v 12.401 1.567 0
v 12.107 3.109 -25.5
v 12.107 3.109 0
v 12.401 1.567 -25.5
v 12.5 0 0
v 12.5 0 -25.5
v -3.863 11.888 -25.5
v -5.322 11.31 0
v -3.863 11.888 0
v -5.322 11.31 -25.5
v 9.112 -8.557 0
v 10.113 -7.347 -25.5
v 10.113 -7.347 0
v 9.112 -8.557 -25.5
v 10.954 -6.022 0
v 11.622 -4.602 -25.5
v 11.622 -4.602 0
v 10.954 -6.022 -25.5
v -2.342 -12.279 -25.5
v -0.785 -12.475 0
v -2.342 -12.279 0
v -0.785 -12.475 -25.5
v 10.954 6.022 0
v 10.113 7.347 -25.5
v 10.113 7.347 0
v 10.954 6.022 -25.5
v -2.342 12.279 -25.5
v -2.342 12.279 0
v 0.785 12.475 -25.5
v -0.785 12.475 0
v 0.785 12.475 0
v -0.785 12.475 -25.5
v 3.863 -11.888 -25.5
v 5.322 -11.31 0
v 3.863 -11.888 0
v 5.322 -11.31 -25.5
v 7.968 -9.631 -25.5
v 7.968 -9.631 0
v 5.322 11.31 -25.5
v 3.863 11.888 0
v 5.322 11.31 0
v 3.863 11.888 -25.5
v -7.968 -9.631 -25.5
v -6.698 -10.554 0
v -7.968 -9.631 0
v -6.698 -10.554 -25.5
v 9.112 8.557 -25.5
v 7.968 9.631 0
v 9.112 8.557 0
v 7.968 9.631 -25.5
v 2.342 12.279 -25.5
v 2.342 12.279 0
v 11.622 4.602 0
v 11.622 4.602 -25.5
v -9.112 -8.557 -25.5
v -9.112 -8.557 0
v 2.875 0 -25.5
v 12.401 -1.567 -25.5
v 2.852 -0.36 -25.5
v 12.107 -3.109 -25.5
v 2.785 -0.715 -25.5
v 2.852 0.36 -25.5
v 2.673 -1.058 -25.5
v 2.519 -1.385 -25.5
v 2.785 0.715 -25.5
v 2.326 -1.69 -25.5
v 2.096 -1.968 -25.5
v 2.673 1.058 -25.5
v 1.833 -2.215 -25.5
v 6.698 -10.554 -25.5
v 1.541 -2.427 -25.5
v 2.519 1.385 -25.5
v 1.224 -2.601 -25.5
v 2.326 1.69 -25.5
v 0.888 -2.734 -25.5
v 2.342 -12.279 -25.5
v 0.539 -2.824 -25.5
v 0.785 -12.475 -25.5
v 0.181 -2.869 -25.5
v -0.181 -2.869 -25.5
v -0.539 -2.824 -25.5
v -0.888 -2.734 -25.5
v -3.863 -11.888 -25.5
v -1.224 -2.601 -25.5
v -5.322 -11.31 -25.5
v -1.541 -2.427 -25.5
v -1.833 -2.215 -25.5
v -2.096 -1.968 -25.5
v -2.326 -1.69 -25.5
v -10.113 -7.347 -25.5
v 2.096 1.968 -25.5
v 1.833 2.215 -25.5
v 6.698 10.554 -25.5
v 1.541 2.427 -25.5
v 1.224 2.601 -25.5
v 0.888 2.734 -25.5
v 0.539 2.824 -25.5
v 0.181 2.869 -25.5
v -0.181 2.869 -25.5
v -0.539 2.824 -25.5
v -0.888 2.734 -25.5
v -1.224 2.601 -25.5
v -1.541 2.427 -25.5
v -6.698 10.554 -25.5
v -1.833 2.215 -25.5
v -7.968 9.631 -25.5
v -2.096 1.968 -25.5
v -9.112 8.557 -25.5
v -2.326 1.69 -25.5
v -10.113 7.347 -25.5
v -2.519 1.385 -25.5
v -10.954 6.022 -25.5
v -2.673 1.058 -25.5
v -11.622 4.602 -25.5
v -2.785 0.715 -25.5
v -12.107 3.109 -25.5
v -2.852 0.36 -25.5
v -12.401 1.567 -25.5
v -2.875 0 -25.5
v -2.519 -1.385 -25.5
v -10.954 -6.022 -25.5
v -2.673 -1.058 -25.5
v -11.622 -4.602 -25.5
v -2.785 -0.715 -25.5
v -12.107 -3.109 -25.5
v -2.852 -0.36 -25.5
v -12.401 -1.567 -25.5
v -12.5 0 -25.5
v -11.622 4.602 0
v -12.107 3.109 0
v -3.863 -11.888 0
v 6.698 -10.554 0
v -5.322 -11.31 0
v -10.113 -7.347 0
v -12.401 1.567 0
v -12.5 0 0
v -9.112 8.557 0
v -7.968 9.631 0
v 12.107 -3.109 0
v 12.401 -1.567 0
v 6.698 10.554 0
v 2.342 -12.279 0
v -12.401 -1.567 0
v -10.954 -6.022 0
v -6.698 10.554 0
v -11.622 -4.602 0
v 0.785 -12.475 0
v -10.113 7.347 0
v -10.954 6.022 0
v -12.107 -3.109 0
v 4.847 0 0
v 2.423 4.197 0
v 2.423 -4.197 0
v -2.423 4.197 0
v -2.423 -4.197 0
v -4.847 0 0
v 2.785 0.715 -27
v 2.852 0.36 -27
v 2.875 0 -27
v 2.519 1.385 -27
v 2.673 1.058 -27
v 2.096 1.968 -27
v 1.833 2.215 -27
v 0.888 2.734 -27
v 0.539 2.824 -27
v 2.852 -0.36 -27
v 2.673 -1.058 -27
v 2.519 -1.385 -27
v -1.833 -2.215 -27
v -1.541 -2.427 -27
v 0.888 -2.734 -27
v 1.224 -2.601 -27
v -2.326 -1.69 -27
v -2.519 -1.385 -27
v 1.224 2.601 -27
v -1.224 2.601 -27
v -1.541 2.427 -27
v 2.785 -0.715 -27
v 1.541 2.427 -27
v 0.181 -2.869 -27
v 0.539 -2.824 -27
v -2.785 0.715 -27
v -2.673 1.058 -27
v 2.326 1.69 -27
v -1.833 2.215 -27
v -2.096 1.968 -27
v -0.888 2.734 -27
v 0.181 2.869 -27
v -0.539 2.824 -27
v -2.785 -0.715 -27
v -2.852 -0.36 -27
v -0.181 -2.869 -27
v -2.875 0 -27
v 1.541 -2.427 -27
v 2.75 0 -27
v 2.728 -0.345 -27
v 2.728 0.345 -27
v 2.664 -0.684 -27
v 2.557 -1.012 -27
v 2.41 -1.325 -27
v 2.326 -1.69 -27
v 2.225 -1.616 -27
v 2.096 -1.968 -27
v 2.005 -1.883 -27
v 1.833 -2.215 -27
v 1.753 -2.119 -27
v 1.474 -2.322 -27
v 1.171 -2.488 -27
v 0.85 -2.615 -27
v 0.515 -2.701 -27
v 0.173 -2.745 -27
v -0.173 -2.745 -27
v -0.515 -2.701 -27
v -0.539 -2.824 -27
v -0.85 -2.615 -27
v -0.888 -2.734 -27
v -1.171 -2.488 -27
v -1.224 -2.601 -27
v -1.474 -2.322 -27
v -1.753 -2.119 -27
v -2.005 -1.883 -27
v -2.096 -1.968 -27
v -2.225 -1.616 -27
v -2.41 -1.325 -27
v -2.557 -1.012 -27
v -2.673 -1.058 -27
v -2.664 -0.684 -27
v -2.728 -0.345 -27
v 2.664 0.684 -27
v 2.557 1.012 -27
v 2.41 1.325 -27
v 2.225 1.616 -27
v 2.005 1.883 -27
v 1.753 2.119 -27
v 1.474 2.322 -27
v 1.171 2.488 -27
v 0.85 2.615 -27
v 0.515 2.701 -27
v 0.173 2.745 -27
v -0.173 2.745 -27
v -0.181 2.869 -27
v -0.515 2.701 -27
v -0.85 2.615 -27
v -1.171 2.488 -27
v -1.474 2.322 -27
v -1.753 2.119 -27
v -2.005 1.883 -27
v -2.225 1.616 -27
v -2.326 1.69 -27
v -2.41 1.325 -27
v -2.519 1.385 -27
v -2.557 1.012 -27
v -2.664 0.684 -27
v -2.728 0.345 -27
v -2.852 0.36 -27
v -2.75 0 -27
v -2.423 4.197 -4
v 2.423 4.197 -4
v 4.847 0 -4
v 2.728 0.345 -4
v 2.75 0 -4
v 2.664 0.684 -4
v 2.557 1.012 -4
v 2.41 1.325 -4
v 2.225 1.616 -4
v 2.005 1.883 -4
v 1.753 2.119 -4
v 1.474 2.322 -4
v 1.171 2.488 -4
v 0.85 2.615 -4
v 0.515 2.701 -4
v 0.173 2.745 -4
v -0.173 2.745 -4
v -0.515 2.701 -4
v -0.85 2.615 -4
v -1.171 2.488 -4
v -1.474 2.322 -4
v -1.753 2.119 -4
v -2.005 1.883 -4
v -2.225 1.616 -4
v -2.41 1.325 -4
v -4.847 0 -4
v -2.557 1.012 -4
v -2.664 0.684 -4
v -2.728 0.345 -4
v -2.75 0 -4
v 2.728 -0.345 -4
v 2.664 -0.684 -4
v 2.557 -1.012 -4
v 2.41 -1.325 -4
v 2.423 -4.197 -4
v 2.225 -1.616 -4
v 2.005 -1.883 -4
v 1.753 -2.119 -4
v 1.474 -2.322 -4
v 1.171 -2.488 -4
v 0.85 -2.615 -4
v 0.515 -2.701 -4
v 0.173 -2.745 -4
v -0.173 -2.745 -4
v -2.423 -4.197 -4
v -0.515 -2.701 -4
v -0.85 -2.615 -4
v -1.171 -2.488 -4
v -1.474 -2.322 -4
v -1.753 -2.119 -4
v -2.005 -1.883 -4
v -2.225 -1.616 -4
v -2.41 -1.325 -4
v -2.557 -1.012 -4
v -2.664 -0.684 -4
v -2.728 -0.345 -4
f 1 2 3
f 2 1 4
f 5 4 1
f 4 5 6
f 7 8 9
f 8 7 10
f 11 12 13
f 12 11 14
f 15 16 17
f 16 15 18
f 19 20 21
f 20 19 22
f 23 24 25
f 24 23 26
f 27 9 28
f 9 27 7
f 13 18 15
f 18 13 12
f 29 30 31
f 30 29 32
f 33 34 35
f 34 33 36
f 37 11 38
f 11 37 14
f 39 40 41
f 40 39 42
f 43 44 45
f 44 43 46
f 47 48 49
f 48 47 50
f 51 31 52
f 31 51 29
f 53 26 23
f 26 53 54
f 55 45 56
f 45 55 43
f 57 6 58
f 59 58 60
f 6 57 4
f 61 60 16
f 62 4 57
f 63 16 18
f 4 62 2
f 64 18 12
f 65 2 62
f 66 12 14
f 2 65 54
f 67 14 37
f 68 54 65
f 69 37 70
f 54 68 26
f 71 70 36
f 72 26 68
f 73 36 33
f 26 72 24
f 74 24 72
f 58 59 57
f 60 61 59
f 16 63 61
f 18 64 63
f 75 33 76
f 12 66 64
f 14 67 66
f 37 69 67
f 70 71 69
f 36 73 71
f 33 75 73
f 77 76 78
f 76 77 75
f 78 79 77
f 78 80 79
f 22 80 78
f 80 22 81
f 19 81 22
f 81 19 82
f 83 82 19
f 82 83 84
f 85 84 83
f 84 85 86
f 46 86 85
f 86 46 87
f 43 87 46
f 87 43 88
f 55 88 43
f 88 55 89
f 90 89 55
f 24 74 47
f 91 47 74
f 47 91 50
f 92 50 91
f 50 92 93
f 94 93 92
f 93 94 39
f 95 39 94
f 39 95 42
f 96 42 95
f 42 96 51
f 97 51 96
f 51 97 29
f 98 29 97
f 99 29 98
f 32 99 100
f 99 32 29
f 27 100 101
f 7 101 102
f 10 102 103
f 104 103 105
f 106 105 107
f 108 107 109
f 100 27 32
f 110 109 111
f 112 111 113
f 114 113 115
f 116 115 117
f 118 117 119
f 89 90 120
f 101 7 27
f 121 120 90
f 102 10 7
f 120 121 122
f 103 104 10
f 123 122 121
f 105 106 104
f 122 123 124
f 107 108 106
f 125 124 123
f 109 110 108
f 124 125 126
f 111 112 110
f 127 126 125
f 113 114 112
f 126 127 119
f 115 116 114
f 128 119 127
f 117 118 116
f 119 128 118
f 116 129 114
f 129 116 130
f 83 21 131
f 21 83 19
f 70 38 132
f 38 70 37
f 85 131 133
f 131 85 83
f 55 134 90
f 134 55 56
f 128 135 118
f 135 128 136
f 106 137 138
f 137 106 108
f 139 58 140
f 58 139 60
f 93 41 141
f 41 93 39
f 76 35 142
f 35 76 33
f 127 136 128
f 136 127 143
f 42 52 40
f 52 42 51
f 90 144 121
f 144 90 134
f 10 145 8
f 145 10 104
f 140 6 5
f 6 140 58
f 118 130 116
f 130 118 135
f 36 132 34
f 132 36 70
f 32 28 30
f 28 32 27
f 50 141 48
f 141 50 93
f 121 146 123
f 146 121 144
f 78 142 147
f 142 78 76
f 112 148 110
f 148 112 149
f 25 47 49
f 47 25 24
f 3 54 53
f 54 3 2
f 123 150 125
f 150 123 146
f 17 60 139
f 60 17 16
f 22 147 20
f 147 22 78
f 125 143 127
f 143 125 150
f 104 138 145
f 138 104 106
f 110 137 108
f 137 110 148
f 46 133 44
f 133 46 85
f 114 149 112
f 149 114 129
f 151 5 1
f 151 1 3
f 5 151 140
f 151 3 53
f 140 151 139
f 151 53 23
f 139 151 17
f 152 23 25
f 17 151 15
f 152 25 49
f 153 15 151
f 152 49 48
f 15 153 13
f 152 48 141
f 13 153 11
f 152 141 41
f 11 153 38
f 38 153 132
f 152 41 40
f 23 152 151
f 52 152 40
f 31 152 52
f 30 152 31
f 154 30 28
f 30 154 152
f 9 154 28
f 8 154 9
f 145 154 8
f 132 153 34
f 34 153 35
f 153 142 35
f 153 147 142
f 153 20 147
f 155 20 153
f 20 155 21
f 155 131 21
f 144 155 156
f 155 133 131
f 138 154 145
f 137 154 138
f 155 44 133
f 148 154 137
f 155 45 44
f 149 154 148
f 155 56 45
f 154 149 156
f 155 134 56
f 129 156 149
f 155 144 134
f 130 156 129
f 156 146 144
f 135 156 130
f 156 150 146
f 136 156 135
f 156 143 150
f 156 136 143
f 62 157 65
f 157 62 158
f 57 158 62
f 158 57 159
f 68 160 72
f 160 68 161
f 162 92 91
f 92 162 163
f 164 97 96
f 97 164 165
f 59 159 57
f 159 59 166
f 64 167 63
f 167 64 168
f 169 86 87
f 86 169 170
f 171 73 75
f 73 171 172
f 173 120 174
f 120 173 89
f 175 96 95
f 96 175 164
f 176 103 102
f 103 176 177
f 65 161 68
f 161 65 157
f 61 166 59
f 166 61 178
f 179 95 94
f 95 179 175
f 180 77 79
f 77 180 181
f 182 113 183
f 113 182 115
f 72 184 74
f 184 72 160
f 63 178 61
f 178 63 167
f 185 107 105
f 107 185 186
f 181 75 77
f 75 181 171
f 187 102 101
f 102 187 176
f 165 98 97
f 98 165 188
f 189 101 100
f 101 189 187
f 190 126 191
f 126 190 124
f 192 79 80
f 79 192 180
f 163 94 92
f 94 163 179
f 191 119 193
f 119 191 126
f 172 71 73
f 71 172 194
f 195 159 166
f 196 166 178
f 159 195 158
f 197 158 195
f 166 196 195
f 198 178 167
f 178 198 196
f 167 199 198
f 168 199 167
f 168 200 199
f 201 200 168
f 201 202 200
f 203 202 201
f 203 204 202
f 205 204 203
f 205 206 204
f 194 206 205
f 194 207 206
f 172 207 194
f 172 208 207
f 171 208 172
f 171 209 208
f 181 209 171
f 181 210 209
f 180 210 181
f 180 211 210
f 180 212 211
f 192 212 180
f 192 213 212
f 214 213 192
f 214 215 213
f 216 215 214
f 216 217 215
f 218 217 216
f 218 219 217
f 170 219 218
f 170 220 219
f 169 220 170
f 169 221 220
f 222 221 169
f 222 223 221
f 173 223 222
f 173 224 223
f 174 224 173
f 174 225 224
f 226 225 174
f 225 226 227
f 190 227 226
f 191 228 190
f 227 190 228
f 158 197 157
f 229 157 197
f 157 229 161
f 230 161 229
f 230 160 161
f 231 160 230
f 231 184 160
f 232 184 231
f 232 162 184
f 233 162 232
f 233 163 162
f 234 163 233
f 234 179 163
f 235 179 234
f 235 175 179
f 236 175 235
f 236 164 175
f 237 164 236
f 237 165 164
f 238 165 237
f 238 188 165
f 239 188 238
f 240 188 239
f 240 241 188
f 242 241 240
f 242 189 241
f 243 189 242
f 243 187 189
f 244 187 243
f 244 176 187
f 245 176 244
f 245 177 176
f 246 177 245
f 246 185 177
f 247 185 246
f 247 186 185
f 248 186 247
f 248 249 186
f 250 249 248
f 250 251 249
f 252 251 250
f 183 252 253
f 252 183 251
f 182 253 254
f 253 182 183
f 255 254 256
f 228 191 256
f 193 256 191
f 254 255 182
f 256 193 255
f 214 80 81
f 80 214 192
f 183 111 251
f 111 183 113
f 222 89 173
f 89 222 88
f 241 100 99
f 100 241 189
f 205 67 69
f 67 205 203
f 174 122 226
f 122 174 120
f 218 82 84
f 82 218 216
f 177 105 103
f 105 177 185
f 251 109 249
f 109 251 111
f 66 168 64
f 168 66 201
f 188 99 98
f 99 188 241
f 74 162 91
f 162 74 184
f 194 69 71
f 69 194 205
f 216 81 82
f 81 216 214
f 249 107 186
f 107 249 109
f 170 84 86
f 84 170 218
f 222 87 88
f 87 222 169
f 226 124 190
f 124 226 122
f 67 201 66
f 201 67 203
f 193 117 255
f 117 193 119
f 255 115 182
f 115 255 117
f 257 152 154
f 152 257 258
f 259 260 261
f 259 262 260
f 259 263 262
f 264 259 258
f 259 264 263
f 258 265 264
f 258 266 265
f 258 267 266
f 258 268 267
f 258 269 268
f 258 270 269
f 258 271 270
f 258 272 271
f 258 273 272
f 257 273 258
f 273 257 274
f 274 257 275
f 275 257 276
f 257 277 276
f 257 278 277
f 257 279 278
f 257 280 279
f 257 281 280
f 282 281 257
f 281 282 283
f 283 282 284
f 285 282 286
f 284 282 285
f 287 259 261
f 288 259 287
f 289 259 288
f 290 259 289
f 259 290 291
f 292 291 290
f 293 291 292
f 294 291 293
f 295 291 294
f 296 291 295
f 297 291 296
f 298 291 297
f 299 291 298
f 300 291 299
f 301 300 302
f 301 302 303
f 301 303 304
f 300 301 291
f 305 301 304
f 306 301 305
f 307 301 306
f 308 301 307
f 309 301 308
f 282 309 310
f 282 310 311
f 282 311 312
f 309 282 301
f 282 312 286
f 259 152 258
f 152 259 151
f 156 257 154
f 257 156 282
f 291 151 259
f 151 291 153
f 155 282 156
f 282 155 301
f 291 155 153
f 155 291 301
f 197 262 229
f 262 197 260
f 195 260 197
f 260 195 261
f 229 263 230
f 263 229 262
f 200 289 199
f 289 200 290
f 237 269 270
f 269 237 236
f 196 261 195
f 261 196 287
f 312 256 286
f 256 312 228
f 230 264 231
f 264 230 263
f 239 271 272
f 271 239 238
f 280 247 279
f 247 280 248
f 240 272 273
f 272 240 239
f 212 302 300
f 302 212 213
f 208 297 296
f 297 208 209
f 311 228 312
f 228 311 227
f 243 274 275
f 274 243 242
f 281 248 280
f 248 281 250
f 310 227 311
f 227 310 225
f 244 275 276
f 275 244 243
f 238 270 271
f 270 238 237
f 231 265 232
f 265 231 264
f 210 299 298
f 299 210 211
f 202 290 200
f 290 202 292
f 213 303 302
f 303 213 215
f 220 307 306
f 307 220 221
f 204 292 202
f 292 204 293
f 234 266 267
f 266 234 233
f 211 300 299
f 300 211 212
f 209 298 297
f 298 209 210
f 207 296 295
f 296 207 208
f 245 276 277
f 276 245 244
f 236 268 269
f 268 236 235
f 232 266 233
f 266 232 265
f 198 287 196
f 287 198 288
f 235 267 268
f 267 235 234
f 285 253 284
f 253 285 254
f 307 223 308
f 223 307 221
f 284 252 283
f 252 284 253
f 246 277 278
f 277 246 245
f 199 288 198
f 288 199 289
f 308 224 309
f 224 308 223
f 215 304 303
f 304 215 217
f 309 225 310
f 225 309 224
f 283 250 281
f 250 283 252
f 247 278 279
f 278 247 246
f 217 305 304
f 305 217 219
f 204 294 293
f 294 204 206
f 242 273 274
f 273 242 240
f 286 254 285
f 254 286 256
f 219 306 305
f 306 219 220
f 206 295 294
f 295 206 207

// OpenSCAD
$fn = 50;


difference() {
	union() {
		translate(v = [0, 0, -25.5000000000]) {
			cylinder(h = 25.5000000000, r = 12.5000000000);
		}
		#translate(v = [0, 0, -27.0000000000]) {
			cylinder(h = 27, r = 2.8750000000);
		}
	}
	union() {
		translate(v = [0, 0, 0]) {
			rotate(a = [0, 0, 0]) {
				difference() {
					union() {
						translate(v = [0, 0, -4]) {
							linear_extrude(height = 4) {
								polygon(points = [[4.8468000000, 0.0000000000], [2.4234000000, 4.1974519271], [-2.4234000000, 4.1974519271], [-4.8468000000, 0.0000000000], [-2.4234000000, -4.1974519271], [2.4234000000, -4.1974519271]]);
							}
						}
					}
					union();
				}
			}
		}
		#translate(v = [0, 0, -100.0000000000]) {
			cylinder(h = 200, r = 2.7500000000);
		}
	}
}
